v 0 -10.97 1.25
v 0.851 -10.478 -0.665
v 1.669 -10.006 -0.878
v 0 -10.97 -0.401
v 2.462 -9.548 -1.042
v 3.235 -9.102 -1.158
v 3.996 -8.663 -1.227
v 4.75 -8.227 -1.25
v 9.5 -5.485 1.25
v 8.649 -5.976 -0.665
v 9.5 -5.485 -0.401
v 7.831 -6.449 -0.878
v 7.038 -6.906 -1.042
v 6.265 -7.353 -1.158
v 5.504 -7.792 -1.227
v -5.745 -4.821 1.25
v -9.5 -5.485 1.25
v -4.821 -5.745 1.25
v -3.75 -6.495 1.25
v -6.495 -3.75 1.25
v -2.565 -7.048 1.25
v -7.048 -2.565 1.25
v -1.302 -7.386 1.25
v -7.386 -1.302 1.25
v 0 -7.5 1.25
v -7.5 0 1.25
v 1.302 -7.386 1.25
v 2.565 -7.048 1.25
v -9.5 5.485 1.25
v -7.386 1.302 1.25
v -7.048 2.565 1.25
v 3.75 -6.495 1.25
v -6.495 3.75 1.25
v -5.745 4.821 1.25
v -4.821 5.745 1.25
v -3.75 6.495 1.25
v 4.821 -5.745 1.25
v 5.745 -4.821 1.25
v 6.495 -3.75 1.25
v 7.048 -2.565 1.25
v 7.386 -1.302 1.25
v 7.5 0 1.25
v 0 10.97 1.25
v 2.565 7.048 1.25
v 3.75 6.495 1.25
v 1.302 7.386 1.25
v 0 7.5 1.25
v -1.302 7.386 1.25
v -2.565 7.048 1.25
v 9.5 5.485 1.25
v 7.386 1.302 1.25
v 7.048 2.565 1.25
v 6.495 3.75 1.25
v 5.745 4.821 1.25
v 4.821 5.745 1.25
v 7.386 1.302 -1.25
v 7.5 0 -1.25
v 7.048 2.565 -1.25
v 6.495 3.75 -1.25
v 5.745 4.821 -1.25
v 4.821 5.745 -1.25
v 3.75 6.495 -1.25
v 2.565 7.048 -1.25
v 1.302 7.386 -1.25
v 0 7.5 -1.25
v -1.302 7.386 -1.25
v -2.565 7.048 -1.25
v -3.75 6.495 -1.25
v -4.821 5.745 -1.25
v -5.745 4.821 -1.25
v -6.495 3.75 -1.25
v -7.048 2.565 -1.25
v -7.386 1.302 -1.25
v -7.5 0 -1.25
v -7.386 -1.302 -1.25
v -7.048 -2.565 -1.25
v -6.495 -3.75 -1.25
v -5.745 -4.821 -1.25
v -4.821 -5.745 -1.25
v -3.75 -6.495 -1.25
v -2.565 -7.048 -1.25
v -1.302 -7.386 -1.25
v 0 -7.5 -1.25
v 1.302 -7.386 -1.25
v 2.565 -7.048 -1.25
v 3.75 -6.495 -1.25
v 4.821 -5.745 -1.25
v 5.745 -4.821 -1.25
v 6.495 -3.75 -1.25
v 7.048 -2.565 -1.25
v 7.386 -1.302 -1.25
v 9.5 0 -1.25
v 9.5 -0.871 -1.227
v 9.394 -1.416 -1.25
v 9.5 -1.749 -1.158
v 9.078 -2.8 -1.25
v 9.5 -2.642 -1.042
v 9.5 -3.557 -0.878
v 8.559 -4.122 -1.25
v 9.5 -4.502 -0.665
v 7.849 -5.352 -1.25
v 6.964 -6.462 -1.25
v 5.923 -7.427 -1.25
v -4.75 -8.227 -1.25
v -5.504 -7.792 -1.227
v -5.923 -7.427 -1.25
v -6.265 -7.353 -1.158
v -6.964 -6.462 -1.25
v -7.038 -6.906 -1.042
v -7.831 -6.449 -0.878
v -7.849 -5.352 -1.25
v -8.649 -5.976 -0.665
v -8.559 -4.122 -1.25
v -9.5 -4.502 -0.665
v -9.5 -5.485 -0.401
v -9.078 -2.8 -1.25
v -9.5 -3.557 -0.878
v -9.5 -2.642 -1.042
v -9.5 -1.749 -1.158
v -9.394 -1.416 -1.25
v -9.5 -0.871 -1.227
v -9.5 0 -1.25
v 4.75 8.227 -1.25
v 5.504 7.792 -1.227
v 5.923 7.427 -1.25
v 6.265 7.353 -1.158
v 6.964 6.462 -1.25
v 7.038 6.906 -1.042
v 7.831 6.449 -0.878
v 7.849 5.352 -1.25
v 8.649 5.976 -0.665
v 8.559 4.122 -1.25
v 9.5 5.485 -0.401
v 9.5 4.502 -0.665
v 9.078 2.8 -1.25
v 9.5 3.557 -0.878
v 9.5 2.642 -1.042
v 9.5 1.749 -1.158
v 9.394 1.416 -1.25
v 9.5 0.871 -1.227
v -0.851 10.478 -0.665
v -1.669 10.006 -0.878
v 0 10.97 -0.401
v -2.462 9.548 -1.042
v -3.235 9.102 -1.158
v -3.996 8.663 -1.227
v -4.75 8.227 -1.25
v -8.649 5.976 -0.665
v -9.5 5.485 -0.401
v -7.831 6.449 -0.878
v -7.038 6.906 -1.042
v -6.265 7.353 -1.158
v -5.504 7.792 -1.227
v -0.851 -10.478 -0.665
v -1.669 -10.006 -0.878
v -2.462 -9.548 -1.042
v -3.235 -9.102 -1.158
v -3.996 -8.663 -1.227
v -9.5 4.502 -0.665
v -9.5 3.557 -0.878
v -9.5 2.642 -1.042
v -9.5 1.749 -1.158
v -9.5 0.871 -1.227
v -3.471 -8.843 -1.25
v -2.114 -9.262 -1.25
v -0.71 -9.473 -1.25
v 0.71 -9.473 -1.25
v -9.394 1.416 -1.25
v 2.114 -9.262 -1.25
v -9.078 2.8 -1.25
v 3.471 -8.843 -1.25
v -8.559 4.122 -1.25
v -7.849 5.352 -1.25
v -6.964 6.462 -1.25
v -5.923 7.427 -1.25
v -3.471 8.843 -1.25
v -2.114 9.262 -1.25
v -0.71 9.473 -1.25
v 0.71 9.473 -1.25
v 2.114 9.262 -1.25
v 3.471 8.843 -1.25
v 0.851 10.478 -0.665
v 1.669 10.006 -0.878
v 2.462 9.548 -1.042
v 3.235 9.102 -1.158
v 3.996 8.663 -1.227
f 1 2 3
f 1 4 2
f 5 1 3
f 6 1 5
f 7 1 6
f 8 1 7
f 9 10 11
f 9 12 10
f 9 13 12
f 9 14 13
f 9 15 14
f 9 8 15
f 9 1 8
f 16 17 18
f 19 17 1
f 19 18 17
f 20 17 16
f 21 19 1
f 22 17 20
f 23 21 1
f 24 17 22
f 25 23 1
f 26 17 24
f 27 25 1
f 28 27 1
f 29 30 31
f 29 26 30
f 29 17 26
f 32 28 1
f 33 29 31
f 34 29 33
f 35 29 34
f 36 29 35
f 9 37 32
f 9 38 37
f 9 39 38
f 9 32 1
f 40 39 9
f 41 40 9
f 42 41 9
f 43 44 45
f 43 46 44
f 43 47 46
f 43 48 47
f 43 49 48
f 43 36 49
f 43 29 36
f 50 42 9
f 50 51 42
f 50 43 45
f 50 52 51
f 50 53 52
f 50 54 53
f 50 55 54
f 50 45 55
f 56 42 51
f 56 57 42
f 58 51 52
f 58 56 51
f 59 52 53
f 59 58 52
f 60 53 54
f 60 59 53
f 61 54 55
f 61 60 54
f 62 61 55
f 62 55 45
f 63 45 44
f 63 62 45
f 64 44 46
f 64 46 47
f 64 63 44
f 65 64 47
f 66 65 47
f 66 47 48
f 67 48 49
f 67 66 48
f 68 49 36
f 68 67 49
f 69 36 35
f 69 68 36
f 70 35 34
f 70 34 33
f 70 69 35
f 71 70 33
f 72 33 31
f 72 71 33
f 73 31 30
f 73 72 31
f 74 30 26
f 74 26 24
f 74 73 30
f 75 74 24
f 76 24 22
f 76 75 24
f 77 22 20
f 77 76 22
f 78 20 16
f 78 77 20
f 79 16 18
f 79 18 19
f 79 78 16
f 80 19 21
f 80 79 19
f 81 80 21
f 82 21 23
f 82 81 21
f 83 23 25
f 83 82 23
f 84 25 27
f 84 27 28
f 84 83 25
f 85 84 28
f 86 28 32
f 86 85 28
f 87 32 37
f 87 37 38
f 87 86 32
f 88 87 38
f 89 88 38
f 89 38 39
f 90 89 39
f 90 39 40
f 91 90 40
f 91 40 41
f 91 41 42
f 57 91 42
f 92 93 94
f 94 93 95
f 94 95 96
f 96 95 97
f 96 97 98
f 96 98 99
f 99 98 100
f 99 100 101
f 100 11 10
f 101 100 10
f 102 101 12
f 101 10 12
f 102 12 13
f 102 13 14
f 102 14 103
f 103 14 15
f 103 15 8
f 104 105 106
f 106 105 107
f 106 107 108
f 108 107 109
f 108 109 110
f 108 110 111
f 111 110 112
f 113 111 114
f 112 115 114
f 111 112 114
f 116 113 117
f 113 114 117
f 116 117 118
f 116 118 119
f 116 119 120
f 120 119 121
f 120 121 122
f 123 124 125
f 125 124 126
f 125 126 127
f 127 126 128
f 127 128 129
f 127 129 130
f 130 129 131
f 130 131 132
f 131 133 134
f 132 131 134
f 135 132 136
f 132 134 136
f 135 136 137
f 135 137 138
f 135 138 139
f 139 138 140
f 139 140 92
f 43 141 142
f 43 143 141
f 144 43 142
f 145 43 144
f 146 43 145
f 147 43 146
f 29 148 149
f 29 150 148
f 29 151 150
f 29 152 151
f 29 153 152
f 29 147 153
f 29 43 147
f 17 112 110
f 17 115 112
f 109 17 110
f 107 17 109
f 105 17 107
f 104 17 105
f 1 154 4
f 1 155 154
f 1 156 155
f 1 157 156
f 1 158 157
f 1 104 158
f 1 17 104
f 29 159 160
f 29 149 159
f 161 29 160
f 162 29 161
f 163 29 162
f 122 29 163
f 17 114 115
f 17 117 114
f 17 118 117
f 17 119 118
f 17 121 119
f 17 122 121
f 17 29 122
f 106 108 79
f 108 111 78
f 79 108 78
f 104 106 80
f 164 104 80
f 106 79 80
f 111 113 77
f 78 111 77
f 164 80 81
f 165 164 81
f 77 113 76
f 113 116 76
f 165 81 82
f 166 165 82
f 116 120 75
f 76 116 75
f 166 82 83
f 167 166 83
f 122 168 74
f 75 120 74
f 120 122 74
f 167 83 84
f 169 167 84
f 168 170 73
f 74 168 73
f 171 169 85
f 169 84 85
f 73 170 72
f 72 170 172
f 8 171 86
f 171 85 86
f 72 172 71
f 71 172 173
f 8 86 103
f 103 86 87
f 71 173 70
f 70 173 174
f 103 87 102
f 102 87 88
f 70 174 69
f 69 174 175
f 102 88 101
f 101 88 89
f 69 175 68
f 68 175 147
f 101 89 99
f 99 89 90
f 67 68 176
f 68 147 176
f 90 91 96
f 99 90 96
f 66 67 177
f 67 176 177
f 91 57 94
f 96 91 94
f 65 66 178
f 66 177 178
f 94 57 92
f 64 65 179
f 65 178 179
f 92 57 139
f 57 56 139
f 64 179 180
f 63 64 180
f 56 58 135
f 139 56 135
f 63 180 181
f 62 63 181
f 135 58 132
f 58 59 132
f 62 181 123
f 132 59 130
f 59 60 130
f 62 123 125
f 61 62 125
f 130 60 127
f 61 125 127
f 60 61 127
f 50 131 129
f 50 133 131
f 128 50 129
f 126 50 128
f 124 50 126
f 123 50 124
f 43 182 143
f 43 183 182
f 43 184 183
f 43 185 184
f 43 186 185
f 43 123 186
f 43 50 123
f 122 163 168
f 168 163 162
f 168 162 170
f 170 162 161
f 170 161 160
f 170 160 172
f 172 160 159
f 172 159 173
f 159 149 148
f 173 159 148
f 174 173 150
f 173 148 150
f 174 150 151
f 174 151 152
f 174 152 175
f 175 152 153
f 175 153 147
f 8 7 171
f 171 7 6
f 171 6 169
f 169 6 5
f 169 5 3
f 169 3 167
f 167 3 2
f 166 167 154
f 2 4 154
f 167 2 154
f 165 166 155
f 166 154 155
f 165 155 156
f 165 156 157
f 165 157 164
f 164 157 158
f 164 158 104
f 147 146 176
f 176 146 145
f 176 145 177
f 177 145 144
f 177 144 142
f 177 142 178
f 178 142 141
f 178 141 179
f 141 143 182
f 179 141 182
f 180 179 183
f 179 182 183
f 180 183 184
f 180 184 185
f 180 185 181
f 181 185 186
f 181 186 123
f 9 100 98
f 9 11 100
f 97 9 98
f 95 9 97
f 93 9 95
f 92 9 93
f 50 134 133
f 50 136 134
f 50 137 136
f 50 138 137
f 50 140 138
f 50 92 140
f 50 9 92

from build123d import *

# Parameters (mm, degrees)
SKETCH1_R           = 7.5
BOSS_EXTRUDE1_DEPTH = 1.25


with BuildPart() as part:
    # Sketch1 → Boss-Extrude1 (new body, symmetric)
    with BuildSketch(Plane.XY):
        Polygon((0, 10.969655115), (-9.5, 5.484827557), (-9.5, -5.484827557), (0, -10.969655115), (9.5, -5.484827557), (9.5, 5.484827557), align=None)
        Circle(SKETCH1_R, mode=Mode.SUBTRACT)
    extrude(amount=BOSS_EXTRUDE1_DEPTH, both=True)

    # Sketch2 → Cut-Revolve1 (revolve, cut)
    with BuildSketch(Plane(origin=(0, 0, 0), x_dir=(1, 0, 0), z_dir=(0, 1, 0))):
        Polygon((-9.5, 1.25), (-12.977549271, -0.757764008), (-12.977549271, 1.25), align=None)
    revolve(axis=Axis((0, 0, 0), (0, 0, -1)), mode=Mode.SUBTRACT)


solid = part.part
